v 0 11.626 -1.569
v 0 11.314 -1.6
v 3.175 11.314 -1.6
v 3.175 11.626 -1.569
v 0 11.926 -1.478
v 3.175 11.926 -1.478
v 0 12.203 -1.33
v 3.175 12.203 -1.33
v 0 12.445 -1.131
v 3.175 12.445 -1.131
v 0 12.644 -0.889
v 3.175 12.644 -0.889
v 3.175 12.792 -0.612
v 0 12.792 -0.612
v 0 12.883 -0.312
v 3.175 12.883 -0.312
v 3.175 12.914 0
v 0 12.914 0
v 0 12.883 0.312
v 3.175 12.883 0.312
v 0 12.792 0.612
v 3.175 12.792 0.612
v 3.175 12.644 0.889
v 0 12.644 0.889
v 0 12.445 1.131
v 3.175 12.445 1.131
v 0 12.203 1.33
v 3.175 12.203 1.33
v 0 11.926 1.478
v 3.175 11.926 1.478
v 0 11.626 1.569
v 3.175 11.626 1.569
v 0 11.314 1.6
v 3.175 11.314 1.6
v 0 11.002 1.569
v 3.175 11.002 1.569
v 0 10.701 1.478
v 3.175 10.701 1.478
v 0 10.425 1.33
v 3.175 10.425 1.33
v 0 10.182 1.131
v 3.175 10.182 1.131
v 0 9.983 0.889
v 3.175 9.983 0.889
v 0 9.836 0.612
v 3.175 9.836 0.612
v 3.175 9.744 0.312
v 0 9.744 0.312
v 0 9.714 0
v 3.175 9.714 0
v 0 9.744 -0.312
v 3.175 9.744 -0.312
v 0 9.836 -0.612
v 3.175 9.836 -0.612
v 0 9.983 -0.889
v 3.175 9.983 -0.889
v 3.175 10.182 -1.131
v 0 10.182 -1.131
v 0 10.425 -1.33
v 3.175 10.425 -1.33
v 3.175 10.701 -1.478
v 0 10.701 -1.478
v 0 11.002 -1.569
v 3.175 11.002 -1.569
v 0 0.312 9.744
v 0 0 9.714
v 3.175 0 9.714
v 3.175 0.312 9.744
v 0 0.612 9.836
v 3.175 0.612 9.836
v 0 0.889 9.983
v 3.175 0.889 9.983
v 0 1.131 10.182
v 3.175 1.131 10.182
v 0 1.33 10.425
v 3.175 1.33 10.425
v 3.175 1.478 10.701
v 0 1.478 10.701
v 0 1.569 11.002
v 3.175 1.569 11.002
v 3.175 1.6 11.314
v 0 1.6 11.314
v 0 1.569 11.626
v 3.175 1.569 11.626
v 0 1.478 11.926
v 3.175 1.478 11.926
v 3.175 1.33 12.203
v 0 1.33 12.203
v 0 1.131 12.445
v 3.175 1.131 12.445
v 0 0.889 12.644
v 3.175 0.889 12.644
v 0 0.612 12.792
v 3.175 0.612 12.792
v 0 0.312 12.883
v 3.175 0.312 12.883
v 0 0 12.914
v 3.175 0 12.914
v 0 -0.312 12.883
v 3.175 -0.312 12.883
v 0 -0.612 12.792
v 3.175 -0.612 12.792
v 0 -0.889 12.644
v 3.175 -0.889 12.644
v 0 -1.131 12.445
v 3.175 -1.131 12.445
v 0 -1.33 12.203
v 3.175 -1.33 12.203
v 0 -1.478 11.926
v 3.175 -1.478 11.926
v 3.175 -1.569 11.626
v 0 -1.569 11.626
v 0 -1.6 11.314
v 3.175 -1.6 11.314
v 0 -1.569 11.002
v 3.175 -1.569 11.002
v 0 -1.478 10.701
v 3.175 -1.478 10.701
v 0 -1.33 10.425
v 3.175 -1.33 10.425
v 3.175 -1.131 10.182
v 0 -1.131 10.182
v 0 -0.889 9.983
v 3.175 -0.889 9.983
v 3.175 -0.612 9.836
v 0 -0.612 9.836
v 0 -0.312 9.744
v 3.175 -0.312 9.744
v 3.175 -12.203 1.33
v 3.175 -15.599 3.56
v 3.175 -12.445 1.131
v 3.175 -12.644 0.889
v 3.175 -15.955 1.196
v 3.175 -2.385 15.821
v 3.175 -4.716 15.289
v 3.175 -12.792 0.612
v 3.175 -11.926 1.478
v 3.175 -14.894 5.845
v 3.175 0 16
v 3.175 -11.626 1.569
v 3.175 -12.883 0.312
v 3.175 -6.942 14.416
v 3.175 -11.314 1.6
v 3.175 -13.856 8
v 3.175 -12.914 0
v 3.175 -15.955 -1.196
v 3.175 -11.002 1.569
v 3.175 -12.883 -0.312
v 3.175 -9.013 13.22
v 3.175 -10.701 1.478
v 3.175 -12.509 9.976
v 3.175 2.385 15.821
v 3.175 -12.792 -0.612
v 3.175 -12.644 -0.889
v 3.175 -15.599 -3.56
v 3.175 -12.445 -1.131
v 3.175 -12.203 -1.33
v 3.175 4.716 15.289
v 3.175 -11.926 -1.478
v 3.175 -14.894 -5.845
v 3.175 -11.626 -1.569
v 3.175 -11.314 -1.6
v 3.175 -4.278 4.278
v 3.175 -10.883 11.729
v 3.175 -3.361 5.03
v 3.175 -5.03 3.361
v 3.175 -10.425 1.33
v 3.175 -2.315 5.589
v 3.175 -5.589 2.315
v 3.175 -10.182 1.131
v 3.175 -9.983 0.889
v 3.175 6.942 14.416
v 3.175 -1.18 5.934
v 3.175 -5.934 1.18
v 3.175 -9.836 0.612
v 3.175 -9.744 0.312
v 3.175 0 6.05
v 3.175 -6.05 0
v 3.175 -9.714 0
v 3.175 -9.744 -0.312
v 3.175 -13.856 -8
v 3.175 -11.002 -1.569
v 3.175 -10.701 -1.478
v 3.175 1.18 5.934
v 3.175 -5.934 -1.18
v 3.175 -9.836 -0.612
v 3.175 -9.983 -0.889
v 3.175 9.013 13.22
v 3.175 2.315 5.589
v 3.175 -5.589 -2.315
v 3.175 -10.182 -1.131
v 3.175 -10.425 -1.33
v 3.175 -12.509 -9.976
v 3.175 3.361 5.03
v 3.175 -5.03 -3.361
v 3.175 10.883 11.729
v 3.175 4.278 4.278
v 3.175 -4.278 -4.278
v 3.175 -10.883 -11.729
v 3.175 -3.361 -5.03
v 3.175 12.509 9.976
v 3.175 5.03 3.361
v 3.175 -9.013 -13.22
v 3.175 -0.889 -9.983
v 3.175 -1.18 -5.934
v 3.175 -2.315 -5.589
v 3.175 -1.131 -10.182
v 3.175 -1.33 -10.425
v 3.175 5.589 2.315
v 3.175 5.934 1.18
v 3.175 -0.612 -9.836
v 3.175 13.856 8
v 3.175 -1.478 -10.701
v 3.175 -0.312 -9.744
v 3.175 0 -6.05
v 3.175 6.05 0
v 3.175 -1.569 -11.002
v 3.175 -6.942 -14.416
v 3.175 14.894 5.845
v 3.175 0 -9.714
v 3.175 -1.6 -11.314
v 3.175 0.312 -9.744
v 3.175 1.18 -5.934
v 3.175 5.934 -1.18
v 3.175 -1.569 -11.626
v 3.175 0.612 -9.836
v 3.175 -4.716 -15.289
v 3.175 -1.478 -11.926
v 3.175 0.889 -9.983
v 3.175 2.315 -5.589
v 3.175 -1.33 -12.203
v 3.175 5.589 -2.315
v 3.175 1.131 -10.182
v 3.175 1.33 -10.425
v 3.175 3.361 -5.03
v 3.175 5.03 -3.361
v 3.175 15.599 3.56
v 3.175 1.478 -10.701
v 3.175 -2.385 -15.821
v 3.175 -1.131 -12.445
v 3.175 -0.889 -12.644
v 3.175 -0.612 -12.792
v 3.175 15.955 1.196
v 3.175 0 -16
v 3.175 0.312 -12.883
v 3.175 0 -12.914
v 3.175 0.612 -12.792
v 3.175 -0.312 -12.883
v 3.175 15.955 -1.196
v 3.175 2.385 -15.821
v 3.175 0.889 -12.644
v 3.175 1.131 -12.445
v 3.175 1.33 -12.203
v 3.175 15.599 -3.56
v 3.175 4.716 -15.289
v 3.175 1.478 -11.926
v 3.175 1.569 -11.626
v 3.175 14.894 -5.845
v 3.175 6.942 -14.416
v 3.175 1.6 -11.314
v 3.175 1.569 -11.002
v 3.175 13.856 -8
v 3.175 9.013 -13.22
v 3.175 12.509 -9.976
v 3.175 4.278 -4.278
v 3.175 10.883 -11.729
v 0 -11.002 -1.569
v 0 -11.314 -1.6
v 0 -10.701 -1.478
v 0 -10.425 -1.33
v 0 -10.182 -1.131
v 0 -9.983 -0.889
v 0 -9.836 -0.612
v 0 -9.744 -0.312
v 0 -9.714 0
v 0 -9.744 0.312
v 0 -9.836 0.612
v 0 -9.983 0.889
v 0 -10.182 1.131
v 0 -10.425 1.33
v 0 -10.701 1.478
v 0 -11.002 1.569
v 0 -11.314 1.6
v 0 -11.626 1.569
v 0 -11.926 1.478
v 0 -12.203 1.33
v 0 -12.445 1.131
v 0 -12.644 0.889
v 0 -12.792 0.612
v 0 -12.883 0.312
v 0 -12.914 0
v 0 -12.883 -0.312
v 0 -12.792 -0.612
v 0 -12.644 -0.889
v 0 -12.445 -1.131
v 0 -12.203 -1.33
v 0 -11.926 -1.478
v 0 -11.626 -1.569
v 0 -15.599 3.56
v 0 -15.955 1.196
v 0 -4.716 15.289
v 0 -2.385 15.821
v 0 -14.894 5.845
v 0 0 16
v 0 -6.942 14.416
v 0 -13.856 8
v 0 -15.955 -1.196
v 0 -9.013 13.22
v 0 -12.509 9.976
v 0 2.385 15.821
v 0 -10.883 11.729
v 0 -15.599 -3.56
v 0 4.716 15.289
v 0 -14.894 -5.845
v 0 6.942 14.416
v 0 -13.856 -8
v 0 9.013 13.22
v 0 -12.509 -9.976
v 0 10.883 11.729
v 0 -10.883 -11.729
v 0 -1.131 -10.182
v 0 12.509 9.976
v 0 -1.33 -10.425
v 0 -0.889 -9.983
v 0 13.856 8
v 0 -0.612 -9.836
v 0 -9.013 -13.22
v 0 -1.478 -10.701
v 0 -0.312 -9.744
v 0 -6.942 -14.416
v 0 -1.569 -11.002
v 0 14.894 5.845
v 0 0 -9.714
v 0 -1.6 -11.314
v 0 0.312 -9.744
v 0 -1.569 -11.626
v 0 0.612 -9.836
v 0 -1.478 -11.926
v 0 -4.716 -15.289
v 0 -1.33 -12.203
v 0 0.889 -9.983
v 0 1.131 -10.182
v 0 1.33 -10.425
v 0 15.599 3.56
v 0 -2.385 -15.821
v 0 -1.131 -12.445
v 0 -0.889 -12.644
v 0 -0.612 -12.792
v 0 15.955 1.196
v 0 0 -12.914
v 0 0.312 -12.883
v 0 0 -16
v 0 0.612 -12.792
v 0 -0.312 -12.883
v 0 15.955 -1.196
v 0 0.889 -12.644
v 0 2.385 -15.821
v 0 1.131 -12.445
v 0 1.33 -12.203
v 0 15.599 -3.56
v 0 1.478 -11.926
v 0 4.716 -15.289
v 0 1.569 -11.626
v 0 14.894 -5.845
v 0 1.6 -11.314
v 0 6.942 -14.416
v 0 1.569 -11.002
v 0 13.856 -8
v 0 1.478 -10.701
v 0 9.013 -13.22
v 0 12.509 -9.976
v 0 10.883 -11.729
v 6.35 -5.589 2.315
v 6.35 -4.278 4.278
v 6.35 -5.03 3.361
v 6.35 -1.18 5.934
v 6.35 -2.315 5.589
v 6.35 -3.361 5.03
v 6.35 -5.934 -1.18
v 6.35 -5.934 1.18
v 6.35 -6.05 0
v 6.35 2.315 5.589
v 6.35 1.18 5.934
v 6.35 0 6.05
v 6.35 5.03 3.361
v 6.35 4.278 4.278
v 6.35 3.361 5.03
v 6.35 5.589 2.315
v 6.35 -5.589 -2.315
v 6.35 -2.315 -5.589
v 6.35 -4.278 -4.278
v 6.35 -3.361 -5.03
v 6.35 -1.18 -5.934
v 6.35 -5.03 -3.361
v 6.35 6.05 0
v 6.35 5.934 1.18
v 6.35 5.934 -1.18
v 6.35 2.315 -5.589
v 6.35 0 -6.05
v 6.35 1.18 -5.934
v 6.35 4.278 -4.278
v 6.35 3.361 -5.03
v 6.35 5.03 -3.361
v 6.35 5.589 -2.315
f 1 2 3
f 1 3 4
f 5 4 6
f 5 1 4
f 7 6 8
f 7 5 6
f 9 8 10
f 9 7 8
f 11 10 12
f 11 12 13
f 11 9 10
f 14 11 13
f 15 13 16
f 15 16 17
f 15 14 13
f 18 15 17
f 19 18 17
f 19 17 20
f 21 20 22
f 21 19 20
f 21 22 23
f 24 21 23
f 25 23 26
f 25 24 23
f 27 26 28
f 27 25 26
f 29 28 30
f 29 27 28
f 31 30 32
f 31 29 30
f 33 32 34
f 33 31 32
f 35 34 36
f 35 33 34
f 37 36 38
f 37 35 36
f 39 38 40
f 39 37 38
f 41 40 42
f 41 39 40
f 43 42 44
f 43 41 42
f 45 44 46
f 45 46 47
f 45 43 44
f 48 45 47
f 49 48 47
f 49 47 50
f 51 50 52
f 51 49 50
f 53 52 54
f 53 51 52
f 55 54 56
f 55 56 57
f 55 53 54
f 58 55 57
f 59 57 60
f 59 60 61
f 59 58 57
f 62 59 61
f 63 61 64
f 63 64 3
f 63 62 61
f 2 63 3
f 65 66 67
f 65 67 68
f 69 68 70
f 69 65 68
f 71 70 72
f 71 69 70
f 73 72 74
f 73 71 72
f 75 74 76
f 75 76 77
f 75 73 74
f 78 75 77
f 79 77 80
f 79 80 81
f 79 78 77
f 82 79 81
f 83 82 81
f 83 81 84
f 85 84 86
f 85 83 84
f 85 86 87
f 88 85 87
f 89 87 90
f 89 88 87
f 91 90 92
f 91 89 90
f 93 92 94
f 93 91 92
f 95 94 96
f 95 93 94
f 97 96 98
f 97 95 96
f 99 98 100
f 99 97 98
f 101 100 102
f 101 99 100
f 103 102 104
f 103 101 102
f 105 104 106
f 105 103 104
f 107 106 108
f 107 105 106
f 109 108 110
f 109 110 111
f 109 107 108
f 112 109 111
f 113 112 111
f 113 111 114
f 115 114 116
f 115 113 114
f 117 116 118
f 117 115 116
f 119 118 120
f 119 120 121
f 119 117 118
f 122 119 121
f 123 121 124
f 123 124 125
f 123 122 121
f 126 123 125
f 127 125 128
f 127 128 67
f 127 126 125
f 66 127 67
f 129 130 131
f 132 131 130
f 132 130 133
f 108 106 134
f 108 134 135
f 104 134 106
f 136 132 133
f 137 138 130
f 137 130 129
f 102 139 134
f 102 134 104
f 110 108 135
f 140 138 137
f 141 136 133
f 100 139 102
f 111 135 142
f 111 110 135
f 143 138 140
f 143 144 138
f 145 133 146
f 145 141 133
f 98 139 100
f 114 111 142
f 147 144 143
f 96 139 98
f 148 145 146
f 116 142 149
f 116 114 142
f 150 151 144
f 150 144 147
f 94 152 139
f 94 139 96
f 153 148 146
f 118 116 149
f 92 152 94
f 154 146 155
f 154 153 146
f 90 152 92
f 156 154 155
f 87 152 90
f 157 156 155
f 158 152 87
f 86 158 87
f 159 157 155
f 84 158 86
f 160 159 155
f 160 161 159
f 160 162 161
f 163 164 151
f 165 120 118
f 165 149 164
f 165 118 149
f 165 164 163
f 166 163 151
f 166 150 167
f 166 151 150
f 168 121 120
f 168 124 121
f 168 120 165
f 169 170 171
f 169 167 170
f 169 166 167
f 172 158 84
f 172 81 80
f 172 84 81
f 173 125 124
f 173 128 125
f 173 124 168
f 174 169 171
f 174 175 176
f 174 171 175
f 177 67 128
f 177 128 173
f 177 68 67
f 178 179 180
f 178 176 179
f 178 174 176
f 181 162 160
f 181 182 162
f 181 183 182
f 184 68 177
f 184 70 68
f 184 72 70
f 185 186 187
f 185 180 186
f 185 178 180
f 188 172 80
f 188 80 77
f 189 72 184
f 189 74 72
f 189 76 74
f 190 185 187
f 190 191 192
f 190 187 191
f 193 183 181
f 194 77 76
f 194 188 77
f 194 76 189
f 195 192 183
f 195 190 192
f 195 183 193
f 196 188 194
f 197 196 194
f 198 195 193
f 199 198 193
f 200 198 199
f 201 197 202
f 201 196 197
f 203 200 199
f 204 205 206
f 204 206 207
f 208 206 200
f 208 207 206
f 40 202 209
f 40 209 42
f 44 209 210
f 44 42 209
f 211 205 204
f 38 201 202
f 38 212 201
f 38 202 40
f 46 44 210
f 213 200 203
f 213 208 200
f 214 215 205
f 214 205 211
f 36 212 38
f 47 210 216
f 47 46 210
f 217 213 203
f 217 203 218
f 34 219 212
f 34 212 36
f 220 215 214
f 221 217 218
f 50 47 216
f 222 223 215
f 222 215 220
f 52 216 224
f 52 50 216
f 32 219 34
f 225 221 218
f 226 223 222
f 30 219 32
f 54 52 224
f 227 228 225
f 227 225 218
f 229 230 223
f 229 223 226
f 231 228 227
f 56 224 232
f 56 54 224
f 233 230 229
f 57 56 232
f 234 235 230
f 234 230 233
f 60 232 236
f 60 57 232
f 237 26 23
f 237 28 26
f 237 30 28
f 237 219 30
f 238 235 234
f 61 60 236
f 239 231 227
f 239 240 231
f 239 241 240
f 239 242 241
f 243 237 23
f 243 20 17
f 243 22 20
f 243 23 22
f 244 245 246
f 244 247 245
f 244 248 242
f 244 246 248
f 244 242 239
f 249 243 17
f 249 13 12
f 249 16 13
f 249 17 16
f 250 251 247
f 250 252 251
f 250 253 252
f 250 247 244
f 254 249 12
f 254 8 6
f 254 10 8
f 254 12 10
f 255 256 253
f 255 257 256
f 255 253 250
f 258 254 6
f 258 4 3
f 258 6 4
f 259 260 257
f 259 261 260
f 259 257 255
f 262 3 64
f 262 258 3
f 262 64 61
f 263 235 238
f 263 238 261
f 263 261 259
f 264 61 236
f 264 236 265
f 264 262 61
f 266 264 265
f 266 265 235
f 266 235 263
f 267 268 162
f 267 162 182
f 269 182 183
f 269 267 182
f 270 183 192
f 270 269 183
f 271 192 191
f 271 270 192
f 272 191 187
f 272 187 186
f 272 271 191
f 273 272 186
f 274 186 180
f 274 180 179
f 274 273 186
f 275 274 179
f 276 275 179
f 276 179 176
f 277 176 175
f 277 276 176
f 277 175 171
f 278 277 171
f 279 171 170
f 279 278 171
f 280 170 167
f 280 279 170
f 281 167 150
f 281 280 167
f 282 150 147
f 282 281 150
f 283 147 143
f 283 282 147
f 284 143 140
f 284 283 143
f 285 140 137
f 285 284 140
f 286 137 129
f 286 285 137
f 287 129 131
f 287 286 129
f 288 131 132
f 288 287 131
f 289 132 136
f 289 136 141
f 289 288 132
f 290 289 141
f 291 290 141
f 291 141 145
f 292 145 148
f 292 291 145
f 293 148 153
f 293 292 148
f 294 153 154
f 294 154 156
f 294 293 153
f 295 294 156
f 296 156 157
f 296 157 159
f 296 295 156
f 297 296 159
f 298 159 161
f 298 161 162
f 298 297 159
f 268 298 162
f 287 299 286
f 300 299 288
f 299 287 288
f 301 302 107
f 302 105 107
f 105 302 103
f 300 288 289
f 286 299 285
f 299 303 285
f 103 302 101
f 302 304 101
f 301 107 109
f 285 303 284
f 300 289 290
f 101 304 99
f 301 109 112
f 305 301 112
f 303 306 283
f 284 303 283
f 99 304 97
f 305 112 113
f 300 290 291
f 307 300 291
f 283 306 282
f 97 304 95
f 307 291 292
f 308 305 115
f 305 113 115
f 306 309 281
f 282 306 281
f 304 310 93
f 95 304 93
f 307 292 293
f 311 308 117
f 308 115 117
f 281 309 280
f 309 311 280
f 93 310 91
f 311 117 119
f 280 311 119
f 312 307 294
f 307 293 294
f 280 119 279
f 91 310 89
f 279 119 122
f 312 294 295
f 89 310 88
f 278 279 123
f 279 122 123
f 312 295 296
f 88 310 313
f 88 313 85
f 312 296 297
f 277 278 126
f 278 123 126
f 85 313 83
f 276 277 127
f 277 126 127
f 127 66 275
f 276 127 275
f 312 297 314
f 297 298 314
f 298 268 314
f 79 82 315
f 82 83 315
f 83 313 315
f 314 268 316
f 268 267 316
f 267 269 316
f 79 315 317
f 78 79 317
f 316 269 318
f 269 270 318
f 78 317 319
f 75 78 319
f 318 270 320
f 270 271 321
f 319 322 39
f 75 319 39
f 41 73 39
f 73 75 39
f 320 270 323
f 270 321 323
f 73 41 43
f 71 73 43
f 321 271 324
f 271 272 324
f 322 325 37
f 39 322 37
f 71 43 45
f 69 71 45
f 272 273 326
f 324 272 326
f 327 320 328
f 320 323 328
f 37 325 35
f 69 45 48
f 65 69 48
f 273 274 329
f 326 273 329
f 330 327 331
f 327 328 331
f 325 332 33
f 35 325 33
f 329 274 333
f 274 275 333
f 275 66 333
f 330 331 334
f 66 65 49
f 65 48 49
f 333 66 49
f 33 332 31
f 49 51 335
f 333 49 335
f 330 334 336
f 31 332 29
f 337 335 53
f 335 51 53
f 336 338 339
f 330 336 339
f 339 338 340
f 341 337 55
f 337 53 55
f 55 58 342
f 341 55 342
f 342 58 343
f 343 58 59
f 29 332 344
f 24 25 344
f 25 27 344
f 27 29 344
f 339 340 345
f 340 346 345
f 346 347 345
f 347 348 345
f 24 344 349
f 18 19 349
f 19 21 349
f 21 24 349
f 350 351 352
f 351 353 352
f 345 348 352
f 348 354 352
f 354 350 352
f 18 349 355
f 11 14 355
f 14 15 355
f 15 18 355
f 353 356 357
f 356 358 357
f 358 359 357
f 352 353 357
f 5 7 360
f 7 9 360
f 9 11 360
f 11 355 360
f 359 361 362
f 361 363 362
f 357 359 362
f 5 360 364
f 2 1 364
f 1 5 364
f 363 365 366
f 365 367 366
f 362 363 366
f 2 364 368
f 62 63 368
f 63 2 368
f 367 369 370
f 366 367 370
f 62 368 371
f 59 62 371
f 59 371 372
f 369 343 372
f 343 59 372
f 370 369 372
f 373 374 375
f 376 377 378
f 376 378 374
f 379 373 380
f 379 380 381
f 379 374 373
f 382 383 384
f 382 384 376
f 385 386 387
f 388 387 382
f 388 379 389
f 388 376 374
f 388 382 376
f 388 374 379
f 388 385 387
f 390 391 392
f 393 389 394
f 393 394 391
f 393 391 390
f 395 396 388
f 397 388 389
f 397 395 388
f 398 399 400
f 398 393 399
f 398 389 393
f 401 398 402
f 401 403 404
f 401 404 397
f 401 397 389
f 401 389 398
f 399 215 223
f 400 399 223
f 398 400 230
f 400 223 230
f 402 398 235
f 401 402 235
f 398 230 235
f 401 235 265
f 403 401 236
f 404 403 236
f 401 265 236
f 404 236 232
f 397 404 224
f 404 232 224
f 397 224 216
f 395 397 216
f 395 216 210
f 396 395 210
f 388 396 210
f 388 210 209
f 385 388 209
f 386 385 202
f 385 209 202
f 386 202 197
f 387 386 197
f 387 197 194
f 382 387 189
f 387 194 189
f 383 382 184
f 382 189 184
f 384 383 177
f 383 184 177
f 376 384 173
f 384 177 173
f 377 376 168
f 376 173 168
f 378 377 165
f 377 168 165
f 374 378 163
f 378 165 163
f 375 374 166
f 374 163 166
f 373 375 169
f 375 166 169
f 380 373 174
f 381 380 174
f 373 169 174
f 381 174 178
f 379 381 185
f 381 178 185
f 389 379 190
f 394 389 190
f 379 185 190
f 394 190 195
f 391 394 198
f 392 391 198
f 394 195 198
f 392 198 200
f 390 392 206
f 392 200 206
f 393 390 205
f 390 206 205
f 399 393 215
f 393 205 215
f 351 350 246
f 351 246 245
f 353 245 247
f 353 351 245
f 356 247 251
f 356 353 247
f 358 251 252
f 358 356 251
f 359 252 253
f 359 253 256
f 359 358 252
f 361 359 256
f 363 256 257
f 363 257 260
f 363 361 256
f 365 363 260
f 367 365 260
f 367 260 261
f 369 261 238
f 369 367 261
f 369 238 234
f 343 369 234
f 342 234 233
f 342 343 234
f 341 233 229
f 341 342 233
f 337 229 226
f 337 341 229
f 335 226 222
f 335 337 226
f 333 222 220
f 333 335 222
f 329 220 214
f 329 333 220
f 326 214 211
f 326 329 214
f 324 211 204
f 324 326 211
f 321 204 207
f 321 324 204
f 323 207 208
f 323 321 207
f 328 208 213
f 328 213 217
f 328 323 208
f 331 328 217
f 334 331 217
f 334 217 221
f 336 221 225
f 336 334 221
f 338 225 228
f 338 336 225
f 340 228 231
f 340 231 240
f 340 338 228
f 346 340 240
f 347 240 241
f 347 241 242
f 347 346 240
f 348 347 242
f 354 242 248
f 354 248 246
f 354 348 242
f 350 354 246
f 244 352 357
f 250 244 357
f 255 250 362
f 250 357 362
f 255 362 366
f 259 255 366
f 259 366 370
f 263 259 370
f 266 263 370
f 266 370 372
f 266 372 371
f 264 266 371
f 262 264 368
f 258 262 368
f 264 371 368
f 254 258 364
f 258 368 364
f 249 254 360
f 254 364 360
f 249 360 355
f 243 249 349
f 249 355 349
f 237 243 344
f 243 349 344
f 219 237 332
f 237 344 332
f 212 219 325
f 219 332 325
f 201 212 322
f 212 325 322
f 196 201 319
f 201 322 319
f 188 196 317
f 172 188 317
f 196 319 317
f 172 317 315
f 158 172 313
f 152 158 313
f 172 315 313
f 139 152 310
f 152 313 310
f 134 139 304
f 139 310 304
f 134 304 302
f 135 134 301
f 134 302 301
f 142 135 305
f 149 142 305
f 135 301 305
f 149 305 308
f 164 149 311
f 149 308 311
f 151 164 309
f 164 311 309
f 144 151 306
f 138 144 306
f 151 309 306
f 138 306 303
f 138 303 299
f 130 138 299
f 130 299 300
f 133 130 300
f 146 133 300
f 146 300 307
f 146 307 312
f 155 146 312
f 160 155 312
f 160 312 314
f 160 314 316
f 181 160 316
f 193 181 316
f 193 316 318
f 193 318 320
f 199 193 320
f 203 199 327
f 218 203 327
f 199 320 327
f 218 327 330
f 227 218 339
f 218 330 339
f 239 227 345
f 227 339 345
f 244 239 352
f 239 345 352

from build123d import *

# Parameters (mm, degrees)
SKETCH1_R           = 16
SKETCH1_R_2         = 1.6
BOSS_EXTRUDE1_DEPTH = 3.175
SKETCH2_R           = 6.05
BOSS_EXTRUDE2_DEPTH = 3.175


with BuildPart() as part:
    # Sketch1 → Boss-Extrude1 (new body)
    with BuildSketch(Plane(origin=(0, 0, 0), x_dir=(0, 0, -1), z_dir=(1, 0, 0))):
        Circle(SKETCH1_R)
        with Locations((0, 11.313708499)):
            Circle(SKETCH1_R_2, mode=Mode.SUBTRACT)
        with Locations((11.313708499, 0)):
            Circle(SKETCH1_R_2, mode=Mode.SUBTRACT)
        with Locations((0, -11.313708499)):
            Circle(SKETCH1_R_2, mode=Mode.SUBTRACT)
        with Locations((-11.313708499, 0)):
            Circle(SKETCH1_R_2, mode=Mode.SUBTRACT)
    extrude(amount=BOSS_EXTRUDE1_DEPTH)

    # Sketch2 → Boss-Extrude2 (add)
    with BuildSketch(Plane(origin=(3.175, 0, 0), x_dir=(0, 0, -1), z_dir=(1, 0, 0))):
        Circle(SKETCH2_R)
    extrude(amount=BOSS_EXTRUDE2_DEPTH)


solid = part.part
